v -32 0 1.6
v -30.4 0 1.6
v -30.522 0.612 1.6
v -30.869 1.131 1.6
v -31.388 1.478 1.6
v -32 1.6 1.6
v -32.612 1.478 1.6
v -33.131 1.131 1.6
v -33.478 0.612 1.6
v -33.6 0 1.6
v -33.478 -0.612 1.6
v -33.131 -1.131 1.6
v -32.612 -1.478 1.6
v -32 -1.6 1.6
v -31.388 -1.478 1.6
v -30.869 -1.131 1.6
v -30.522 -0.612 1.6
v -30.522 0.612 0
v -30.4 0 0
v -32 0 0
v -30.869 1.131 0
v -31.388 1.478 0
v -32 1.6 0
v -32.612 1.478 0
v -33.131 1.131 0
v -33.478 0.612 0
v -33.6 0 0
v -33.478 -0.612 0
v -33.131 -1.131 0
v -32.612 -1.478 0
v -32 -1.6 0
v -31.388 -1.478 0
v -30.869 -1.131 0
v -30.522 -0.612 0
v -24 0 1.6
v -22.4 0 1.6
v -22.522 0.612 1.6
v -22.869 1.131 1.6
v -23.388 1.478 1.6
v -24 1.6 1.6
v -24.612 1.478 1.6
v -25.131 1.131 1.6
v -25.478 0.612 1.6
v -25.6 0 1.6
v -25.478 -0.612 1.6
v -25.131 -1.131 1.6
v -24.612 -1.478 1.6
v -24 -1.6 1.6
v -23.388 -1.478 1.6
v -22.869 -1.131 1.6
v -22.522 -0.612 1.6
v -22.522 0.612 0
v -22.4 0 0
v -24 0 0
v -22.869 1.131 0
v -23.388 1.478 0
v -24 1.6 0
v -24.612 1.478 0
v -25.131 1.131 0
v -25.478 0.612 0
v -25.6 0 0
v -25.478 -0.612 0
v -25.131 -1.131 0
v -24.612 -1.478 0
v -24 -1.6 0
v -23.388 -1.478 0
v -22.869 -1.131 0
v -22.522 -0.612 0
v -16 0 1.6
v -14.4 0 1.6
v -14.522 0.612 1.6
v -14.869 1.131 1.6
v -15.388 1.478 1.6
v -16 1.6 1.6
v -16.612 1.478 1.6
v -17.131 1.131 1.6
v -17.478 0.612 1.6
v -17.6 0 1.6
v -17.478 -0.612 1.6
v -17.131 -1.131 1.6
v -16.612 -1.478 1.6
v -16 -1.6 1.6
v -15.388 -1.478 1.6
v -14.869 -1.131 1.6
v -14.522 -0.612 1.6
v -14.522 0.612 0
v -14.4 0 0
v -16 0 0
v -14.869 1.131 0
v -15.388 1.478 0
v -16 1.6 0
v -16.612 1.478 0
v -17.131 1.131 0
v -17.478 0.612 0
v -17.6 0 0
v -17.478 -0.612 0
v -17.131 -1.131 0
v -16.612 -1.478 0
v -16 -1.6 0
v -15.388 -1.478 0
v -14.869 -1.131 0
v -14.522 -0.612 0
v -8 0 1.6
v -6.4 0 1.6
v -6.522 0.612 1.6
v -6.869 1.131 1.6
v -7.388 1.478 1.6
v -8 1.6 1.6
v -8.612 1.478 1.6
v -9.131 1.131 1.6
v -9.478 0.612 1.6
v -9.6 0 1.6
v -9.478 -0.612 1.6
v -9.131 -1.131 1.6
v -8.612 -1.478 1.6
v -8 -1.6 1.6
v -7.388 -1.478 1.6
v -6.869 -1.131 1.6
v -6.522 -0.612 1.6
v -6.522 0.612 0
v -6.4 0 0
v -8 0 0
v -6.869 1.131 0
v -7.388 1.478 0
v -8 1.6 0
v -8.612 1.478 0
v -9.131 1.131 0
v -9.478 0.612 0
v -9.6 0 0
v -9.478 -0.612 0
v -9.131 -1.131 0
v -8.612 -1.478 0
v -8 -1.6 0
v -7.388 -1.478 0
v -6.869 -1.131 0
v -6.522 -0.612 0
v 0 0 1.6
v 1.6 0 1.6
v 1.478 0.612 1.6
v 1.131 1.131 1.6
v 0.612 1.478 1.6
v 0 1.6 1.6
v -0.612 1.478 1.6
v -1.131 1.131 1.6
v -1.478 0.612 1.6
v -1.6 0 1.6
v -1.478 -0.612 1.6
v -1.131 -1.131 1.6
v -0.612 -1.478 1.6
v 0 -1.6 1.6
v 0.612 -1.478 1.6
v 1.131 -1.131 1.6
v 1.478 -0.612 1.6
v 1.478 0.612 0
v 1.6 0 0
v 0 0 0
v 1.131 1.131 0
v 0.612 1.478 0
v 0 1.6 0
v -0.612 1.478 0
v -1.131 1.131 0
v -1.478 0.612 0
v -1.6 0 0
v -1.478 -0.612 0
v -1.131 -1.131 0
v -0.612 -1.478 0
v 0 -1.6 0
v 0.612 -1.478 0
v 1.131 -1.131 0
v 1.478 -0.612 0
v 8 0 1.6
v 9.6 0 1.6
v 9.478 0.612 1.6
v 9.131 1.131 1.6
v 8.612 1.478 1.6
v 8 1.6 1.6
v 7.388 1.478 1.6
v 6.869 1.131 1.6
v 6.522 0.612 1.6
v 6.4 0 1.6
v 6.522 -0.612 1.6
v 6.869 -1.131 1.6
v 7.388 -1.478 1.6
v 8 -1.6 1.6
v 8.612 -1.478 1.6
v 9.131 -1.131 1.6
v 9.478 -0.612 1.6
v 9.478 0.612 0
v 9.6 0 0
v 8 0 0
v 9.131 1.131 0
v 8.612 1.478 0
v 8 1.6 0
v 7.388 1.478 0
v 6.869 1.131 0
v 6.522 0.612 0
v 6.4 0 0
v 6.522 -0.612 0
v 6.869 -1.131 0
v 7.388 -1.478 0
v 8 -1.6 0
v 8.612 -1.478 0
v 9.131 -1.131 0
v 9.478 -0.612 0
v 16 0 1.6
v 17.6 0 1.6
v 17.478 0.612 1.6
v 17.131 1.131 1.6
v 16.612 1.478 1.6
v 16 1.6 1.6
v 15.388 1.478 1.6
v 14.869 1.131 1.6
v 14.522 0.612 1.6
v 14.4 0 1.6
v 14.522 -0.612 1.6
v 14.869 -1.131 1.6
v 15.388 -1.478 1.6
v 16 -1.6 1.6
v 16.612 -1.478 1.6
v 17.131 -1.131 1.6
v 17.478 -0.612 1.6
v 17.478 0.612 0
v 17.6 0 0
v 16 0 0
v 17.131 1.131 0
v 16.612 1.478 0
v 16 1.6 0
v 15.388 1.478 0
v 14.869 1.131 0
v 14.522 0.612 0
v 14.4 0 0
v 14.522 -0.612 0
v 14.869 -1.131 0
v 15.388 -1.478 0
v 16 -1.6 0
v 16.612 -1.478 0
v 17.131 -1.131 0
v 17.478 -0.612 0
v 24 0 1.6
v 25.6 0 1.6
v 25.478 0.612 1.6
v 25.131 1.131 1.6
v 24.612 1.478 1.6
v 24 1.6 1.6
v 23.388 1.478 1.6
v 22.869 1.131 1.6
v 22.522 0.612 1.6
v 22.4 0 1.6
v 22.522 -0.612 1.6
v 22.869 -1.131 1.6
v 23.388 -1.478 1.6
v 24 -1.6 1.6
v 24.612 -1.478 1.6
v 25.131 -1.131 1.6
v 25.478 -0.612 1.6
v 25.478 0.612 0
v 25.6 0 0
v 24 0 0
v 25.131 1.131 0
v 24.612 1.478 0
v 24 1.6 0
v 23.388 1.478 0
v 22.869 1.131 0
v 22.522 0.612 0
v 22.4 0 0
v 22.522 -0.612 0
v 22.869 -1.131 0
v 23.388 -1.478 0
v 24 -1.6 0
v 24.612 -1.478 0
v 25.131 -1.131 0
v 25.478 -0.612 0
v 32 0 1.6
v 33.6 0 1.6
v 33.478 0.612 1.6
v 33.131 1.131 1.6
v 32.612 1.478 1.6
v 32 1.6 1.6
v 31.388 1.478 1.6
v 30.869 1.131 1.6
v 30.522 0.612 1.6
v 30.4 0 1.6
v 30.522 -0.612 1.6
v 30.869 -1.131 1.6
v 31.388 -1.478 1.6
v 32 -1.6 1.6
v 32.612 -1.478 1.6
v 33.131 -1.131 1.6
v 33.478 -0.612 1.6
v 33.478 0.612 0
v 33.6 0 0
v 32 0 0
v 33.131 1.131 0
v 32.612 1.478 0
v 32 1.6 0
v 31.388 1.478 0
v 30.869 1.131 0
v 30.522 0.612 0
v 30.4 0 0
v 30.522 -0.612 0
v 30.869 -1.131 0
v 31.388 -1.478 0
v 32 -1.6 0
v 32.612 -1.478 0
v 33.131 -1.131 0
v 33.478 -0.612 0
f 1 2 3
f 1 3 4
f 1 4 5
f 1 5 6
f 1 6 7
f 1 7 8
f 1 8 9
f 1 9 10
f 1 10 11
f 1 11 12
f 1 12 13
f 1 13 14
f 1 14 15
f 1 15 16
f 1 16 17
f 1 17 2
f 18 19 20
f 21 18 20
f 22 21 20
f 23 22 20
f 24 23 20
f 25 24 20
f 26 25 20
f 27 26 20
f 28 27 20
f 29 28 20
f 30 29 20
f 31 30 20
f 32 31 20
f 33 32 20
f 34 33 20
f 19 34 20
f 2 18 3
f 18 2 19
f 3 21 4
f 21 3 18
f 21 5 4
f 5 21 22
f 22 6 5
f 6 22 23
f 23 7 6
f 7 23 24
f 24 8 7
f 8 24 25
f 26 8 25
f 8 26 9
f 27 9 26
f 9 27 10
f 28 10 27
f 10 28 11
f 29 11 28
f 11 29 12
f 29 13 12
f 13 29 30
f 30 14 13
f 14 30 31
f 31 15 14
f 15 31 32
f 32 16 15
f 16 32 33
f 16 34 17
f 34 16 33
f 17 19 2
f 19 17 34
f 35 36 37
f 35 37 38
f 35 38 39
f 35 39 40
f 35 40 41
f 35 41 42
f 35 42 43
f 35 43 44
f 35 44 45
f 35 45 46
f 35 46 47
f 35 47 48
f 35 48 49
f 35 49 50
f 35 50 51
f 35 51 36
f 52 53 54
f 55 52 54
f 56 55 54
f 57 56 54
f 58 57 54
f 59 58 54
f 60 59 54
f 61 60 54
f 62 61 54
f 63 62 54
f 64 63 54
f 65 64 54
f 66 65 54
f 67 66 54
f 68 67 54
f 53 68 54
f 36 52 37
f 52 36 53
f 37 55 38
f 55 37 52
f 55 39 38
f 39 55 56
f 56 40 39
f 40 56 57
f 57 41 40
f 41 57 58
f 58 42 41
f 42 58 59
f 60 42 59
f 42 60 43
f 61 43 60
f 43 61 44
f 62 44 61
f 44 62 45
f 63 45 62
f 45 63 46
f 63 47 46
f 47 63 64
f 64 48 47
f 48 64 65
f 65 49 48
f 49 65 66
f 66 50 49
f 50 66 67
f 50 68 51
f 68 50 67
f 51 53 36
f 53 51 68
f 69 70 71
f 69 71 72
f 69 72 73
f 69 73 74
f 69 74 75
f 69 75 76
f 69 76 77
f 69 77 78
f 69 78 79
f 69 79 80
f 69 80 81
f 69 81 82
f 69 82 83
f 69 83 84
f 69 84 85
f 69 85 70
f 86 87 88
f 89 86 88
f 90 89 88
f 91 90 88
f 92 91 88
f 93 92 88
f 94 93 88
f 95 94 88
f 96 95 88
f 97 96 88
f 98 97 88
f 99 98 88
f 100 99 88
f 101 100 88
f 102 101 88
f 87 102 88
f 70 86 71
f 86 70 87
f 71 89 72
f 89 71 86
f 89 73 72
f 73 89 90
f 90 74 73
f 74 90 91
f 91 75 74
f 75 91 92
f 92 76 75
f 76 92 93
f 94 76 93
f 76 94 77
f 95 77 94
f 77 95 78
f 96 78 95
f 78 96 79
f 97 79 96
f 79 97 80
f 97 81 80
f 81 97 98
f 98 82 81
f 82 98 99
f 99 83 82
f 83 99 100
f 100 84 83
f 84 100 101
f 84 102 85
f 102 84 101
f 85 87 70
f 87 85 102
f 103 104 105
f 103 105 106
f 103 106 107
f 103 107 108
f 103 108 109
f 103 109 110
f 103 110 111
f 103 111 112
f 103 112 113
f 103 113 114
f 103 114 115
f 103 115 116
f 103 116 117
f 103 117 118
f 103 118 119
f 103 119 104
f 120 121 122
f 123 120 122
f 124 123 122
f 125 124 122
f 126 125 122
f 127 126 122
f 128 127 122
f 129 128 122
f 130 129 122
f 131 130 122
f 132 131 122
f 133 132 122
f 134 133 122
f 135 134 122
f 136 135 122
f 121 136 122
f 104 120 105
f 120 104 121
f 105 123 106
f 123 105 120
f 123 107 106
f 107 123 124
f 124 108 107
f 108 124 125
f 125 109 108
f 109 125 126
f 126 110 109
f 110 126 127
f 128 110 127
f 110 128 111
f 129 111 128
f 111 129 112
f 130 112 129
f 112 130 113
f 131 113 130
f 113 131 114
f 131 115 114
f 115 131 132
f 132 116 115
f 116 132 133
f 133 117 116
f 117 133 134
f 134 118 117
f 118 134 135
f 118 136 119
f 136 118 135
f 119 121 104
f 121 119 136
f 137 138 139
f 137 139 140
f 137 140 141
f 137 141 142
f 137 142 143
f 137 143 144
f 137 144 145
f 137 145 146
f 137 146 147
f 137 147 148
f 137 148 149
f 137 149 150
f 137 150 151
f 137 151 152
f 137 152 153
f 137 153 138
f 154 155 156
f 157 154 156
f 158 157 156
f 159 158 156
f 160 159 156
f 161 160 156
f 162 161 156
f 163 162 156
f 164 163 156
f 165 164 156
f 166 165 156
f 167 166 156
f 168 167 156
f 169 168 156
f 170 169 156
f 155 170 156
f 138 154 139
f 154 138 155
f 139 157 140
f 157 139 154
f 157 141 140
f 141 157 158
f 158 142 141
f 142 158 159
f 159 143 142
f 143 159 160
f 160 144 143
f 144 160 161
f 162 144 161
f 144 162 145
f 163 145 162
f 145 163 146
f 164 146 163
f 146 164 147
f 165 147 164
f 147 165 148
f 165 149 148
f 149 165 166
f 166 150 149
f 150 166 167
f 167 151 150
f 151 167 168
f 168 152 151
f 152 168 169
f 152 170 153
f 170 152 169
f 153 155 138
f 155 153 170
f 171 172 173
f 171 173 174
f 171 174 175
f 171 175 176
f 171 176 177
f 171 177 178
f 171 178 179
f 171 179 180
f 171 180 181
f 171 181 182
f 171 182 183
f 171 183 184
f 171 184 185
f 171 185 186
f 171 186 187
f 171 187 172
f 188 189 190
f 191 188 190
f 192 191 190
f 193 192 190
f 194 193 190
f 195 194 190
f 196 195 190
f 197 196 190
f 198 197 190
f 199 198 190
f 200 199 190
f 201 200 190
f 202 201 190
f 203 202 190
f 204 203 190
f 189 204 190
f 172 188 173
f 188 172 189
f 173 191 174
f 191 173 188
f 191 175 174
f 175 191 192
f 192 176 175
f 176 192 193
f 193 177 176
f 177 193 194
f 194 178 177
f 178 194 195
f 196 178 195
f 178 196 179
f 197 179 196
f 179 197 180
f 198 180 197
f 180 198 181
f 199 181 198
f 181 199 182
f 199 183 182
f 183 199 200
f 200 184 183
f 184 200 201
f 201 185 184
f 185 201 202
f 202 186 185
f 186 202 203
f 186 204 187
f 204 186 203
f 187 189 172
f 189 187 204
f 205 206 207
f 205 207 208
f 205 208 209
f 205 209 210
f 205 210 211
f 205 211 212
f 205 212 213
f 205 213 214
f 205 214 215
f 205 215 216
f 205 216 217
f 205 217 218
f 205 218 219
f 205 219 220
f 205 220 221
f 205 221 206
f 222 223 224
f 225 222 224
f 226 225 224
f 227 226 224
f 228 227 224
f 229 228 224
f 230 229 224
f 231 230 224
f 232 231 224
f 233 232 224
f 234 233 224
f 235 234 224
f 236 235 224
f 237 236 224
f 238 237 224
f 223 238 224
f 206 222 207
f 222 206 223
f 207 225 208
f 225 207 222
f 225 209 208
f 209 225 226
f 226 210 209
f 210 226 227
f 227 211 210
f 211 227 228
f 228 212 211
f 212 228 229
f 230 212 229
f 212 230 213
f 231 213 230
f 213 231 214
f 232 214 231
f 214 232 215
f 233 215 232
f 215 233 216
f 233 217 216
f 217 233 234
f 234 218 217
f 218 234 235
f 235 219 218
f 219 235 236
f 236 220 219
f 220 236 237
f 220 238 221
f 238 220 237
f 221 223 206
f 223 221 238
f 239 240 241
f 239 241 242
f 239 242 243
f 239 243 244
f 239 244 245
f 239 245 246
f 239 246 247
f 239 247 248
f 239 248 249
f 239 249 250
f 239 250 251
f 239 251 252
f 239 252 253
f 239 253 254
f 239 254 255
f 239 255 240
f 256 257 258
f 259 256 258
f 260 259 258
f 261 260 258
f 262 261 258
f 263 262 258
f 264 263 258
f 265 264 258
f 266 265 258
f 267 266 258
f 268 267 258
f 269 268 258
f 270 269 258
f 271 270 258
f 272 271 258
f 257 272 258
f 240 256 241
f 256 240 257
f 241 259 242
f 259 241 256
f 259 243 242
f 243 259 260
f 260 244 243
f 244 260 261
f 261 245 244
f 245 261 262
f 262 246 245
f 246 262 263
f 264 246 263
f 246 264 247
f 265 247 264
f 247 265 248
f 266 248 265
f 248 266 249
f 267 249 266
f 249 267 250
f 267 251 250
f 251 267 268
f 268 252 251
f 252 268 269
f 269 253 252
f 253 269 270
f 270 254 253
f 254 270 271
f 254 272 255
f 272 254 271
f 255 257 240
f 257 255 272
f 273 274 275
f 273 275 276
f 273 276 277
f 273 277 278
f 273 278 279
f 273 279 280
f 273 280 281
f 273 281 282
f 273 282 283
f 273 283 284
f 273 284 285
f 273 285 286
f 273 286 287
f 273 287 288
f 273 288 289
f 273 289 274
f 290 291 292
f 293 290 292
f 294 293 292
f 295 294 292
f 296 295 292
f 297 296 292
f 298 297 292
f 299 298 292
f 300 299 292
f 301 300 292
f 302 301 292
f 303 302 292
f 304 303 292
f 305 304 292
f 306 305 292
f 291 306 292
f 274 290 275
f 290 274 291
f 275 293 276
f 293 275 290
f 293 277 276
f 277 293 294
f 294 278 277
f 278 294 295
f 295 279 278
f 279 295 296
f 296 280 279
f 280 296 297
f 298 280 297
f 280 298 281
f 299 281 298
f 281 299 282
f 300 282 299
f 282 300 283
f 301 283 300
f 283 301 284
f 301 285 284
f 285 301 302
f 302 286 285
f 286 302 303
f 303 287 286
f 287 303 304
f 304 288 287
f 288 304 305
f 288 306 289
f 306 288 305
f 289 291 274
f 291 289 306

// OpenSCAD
// file: 4-4edge.scad
use <../lib.scad>
function ldraw_lib__4_4edge() = [
// 0 Circle 1.0
// 0 Name: 4-4edge.dat
// 0 Author: James Jessiman
// 0 !LDRAW_ORG Primitive UPDATE 2017-01
// 0 !LICENSE Licensed under CC BY 2.0 and CC BY 4.0 : see CAreadme.txt
// 
// 0 BFC CERTIFY CCW
  [0,"BFC","CERTIFY"],
  [0,"BFC","CCW"],
// 
// 0 !HISTORY 1998-12-15 [PTadmin] Official Update 1998-10
// 0 !HISTORY 2005-12-28 [PTadmin] Official Update 2005-01
// 0 !HISTORY 2007-06-24 [PTadmin] Header formatted for Contributor Agreement
// 0 !HISTORY 2008-07-01 [PTadmin] Official Update 2008-01
// 0 !HISTORY 2017-01-15 [Steffen] BFCed
// 0 !HISTORY 2017-12-30 [PTadmin] Official Update 2017-01
// 
// 
// 2 24 1 0 0 0.9239 0 0.3827
  [2,24,1,0,0,0.9239,0,0.3827],
// 2 24 0.9239 0 0.3827 0.7071 0 0.7071
  [2,24,0.9239,0,0.3827,0.7071,0,0.7071],
// 2 24 0.7071 0 0.7071 0.3827 0 0.9239
  [2,24,0.7071,0,0.7071,0.3827,0,0.9239],
// 2 24 0.3827 0 0.9239 0 0 1
  [2,24,0.3827,0,0.9239,0,0,1],
// 2 24 0 0 1 -0.3827 0 0.9239
  [2,24,0,0,1,-0.3827,0,0.9239],
// 2 24 -0.3827 0 0.9239 -0.7071 0 0.7071
  [2,24,-0.3827,0,0.9239,-0.7071,0,0.7071],
// 2 24 -0.7071 0 0.7071 -0.9239 0 0.3827
  [2,24,-0.7071,0,0.7071,-0.9239,0,0.3827],
// 2 24 -0.9239 0 0.3827 -1 0 -0
  [2,24,-0.9239,0,0.3827,-1,0,-0],
// 2 24 -1 0 -0 -0.9239 0 -0.3827
  [2,24,-1,0,-0,-0.9239,0,-0.3827],
// 2 24 -0.9239 0 -0.3827 -0.7071 0 -0.7071
  [2,24,-0.9239,0,-0.3827,-0.7071,0,-0.7071],
// 2 24 -0.7071 0 -0.7071 -0.3827 0 -0.9239
  [2,24,-0.7071,0,-0.7071,-0.3827,0,-0.9239],
// 2 24 -0.3827 0 -0.9239 0 0 -1
  [2,24,-0.3827,0,-0.9239,0,0,-1],
// 2 24 0 0 -1 0.3827 0 -0.9239
  [2,24,0,0,-1,0.3827,0,-0.9239],
// 2 24 0.3827 0 -0.9239 0.7071 0 -0.7071
  [2,24,0.3827,0,-0.9239,0.7071,0,-0.7071],
// 2 24 0.7071 0 -0.7071 0.9239 0 -0.3827
  [2,24,0.7071,0,-0.7071,0.9239,0,-0.3827],
// 2 24 0.9239 0 -0.3827 1 0 0
  [2,24,0.9239,0,-0.3827,1,0,0],
];
module ldraw_lib__4_4edge(step=0, col=false, unit=2/5, alt=false, line=0.2, solid=!$preview)
    makepoly(ldraw_lib__4_4edge(), step=step, col=col, unit=unit, alt=alt, line=line, solid=solid);
ldraw_lib__4_4edge(line=0.2);
// file: 4-4disc.scad
use <../lib.scad>
function ldraw_lib__4_4disc() = [
// 0 Disc 1.0
// 0 Name: 4-4disc.dat
// 0 Author: James Jessiman
// 0 !LDRAW_ORG Primitive UPDATE 2002-02
// 0 !LICENSE Licensed under CC BY 2.0 and CC BY 4.0 : see CAreadme.txt
// 
// 0 BFC CERTIFY CCW
  [0,"BFC","CERTIFY"],
  [0,"BFC","CCW"],
// 
// 0 !HISTORY 1998-12-15 [PTadmin] Official Update 1998-10
// 0 !HISTORY 2002-03-23 [sbliss] Added BFC statement
// 0 !HISTORY 2002-04-25 [PTadmin] Official Update 2002-02
// 0 !HISTORY 2007-06-24 [PTadmin] Header formatted for Contributor Agreement
// 0 !HISTORY 2008-07-01 [PTadmin] Official Update 2008-01
// 
// 
// 3 16 0 0 0 1 0 0 0.9239 0 0.3827
  [3,16,0,0,0,1,0,0,0.9239,0,0.3827],
// 3 16 0 0 0 0.9239 0 0.3827 0.7071 0 0.7071
  [3,16,0,0,0,0.9239,0,0.3827,0.7071,0,0.7071],
// 3 16 0 0 0 0.7071 0 0.7071 0.3827 0 0.9239
  [3,16,0,0,0,0.7071,0,0.7071,0.3827,0,0.9239],
// 3 16 0 0 0 0.3827 0 0.9239 0 0 1
  [3,16,0,0,0,0.3827,0,0.9239,0,0,1],
// 3 16 0 0 0 0 0 1 -0.3827 0 0.9239
  [3,16,0,0,0,0,0,1,-0.3827,0,0.9239],
// 3 16 0 0 0 -0.3827 0 0.9239 -0.7071 0 0.7071
  [3,16,0,0,0,-0.3827,0,0.9239,-0.7071,0,0.7071],
// 3 16 0 0 0 -0.7071 0 0.7071 -0.9239 0 0.3827
  [3,16,0,0,0,-0.7071,0,0.7071,-0.9239,0,0.3827],
// 3 16 0 0 0 -0.9239 0 0.3827 -1 0 -0
  [3,16,0,0,0,-0.9239,0,0.3827,-1,0,-0],
// 3 16 0 0 0 -1 0 -0 -0.9239 0 -0.3827
  [3,16,0,0,0,-1,0,-0,-0.9239,0,-0.3827],
// 3 16 0 0 0 -0.9239 0 -0.3827 -0.7071 0 -0.7071
  [3,16,0,0,0,-0.9239,0,-0.3827,-0.7071,0,-0.7071],
// 3 16 0 0 0 -0.7071 0 -0.7071 -0.3827 0 -0.9239
  [3,16,0,0,0,-0.7071,0,-0.7071,-0.3827,0,-0.9239],
// 3 16 0 0 0 -0.3827 0 -0.9239 0 0 -1
  [3,16,0,0,0,-0.3827,0,-0.9239,0,0,-1],
// 3 16 0 0 0 0 0 -1 0.3827 0 -0.9239
  [3,16,0,0,0,0,0,-1,0.3827,0,-0.9239],
// 3 16 0 0 0 0.3827 0 -0.9239 0.7071 0 -0.7071
  [3,16,0,0,0,0.3827,0,-0.9239,0.7071,0,-0.7071],
// 3 16 0 0 0 0.7071 0 -0.7071 0.9239 0 -0.3827
  [3,16,0,0,0,0.7071,0,-0.7071,0.9239,0,-0.3827],
// 3 16 0 0 0 0.9239 0 -0.3827 1 0 0
  [3,16,0,0,0,0.9239,0,-0.3827,1,0,0],
// 0
];
module ldraw_lib__4_4disc(step=0, col=false, unit=2/5, alt=false, line=0.2, solid=!$preview)
    makepoly(ldraw_lib__4_4disc(), step=step, col=col, unit=unit, alt=alt, line=line, solid=solid);
ldraw_lib__4_4disc(line=0.2);
// file: 4-4cyli.scad
use <../lib.scad>
$fa=1; $fs=0.2;
function ldraw_lib__4_4cyli(realsolid=false) = [
// 0 Cylinder 1.0
// 0 Name: 4-4cyli.dat
// 0 Author: James Jessiman
// 0 !LDRAW_ORG Primitive UPDATE 2005-01
// 0 !LICENSE Licensed under CC BY 2.0 and CC BY 4.0 : see CAreadme.txt
// 
// 0 BFC CERTIFY CCW
  [0,"BFC","CERTIFY"],
  [0,"BFC","CCW"],
// 
// 0 !HISTORY 1998-12-15 [PTadmin] Official Update 1998-10
// 0 !HISTORY 2002-03-23 [sbliss] Added BFC statement; merged headers from files in distributions LDraw 0.27 and Complete.
// 0 !HISTORY 2002-04-25 [PTadmin] Official Update 2002-02
// 0 !HISTORY 2004-12-14 [guyvivan] BFC CCW
// 0 !HISTORY 2005-12-28 [PTadmin] Official Update 2005-01
// 0 !HISTORY 2007-06-24 [PTadmin] Header formatted for Contributor Agreement
// 0 !HISTORY 2008-07-01 [PTadmin] Official Update 2008-01
// 
// 
// 4 16 1 1 0 0.9239 1 0.3827 0.9239 0 0.3827 1 0 0
  [4,16,1,1,0,0.9239,1,0.3827,0.9239,0,0.3827,1,0,0],
// 5 24 1 0 0 1 1 0 0.9239 0 0.3827 0.9239 0 -0.3827
  [5,24,1,0,0,1,1,0,0.9239,0,0.3827,0.9239,0,-0.3827],
// 4 16 0.9239 1 0.3827 0.7071 1 0.7071 0.7071 0 0.7071 0.9239 0 0.3827
  [4,16,0.9239,1,0.3827,0.7071,1,0.7071,0.7071,0,0.7071,0.9239,0,0.3827],
// 5 24 0.9239 0 0.3827 0.9239 1 0.3827 0.7071 0 0.7071 1 0 0
  [5,24,0.9239,0,0.3827,0.9239,1,0.3827,0.7071,0,0.7071,1,0,0],
// 4 16 0.7071 1 0.7071 0.3827 1 0.9239 0.3827 0 0.9239 0.7071 0 0.7071
  [4,16,0.7071,1,0.7071,0.3827,1,0.9239,0.3827,0,0.9239,0.7071,0,0.7071],
// 5 24 0.7071 0 0.7071 0.7071 1 0.7071 0.3827 0 0.9239 0.9239 0 0.3827
  [5,24,0.7071,0,0.7071,0.7071,1,0.7071,0.3827,0,0.9239,0.9239,0,0.3827],
// 4 16 0.3827 1 0.9239 0 1 1 0 0 1 0.3827 0 0.9239
  [4,16,0.3827,1,0.9239,0,1,1,0,0,1,0.3827,0,0.9239],
// 5 24 0.3827 0 0.9239 0.3827 1 0.9239 0 0 1 0.7071 0 0.7071
  [5,24,0.3827,0,0.9239,0.3827,1,0.9239,0,0,1,0.7071,0,0.7071],
// 4 16 0 1 1 -0.3827 1 0.9239 -0.3827 0 0.9239 0 0 1
  [4,16,0,1,1,-0.3827,1,0.9239,-0.3827,0,0.9239,0,0,1],
// 5 24 0 0 1 0 1 1 -0.3827 0 0.9239 0.3827 0 0.9239
  [5,24,0,0,1,0,1,1,-0.3827,0,0.9239,0.3827,0,0.9239],
// 4 16 -0.3827 1 0.9239 -0.7071 1 0.7071 -0.7071 0 0.7071 -0.3827 0 0.9239
  [4,16,-0.3827,1,0.9239,-0.7071,1,0.7071,-0.7071,0,0.7071,-0.3827,0,0.9239],
// 5 24 -0.3827 0 0.9239 -0.3827 1 0.9239 -0.7071 0 0.7071 0 0 1
  [5,24,-0.3827,0,0.9239,-0.3827,1,0.9239,-0.7071,0,0.7071,0,0,1],
// 4 16 -0.7071 1 0.7071 -0.9239 1 0.3827 -0.9239 0 0.3827 -0.7071 0 0.7071
  [4,16,-0.7071,1,0.7071,-0.9239,1,0.3827,-0.9239,0,0.3827,-0.7071,0,0.7071],
// 5 24 -0.7071 0 0.7071 -0.7071 1 0.7071 -0.9239 0 0.3827 -0.3827 0 0.9239
  [5,24,-0.7071,0,0.7071,-0.7071,1,0.7071,-0.9239,0,0.3827,-0.3827,0,0.9239],
// 4 16 -0.9239 1 0.3827 -1 1 0 -1 0 0 -0.9239 0 0.3827
  [4,16,-0.9239,1,0.3827,-1,1,0,-1,0,0,-0.9239,0,0.3827],
// 5 24 -0.9239 0 0.3827 -0.9239 1 0.3827 -1 0 0 -0.7071 0 0.7071
  [5,24,-0.9239,0,0.3827,-0.9239,1,0.3827,-1,0,0,-0.7071,0,0.7071],
// 4 16 -1 1 0 -0.9239 1 -0.3827 -0.9239 0 -0.3827 -1 0 0
  [4,16,-1,1,0,-0.9239,1,-0.3827,-0.9239,0,-0.3827,-1,0,0],
// 5 24 -1 0 0 -1 1 0 -0.9239 0 -0.3827 -0.9239 0 0.3827
  [5,24,-1,0,0,-1,1,0,-0.9239,0,-0.3827,-0.9239,0,0.3827],
// 4 16 -0.9239 1 -0.3827 -0.7071 1 -0.7071 -0.7071 0 -0.7071 -0.9239 0 -0.3827
  [4,16,-0.9239,1,-0.3827,-0.7071,1,-0.7071,-0.7071,0,-0.7071,-0.9239,0,-0.3827],
// 5 24 -0.9239 0 -0.3827 -0.9239 1 -0.3827 -0.7071 0 -0.7071 -1 0 0
  [5,24,-0.9239,0,-0.3827,-0.9239,1,-0.3827,-0.7071,0,-0.7071,-1,0,0],
// 4 16 -0.7071 1 -0.7071 -0.3827 1 -0.9239 -0.3827 0 -0.9239 -0.7071 0 -0.7071
  [4,16,-0.7071,1,-0.7071,-0.3827,1,-0.9239,-0.3827,0,-0.9239,-0.7071,0,-0.7071],
// 5 24 -0.7071 0 -0.7071 -0.7071 1 -0.7071 -0.3827 0 -0.9239 -0.9239 0 -0.3827
  [5,24,-0.7071,0,-0.7071,-0.7071,1,-0.7071,-0.3827,0,-0.9239,-0.9239,0,-0.3827],
// 4 16 -0.3827 1 -0.9239 0 1 -1 0 0 -1 -0.3827 0 -0.9239
  [4,16,-0.3827,1,-0.9239,0,1,-1,0,0,-1,-0.3827,0,-0.9239],
// 5 24 -0.3827 0 -0.9239 -0.3827 1 -0.9239 0 0 -1 -0.7071 0 -0.7071
  [5,24,-0.3827,0,-0.9239,-0.3827,1,-0.9239,0,0,-1,-0.7071,0,-0.7071],
// 4 16 0 1 -1 0.3827 1 -0.9239 0.3827 0 -0.9239 0 0 -1
  [4,16,0,1,-1,0.3827,1,-0.9239,0.3827,0,-0.9239,0,0,-1],
// 5 24 0 0 -1 0 1 -1 0.3827 0 -0.9239 -0.3827 0 -0.9239
  [5,24,0,0,-1,0,1,-1,0.3827,0,-0.9239,-0.3827,0,-0.9239],
// 4 16 0.3827 1 -0.9239 0.7071 1 -0.7071 0.7071 0 -0.7071 0.3827 0 -0.9239
  [4,16,0.3827,1,-0.9239,0.7071,1,-0.7071,0.7071,0,-0.7071,0.3827,0,-0.9239],
// 5 24 0.3827 0 -0.9239 0.3827 1 -0.9239 0.7071 0 -0.7071 0 0 -1
  [5,24,0.3827,0,-0.9239,0.3827,1,-0.9239,0.7071,0,-0.7071,0,0,-1],
// 4 16 0.7071 1 -0.7071 0.9239 1 -0.3827 0.9239 0 -0.3827 0.7071 0 -0.7071
  [4,16,0.7071,1,-0.7071,0.9239,1,-0.3827,0.9239,0,-0.3827,0.7071,0,-0.7071],
// 5 24 0.7071 0 -0.7071 0.7071 1 -0.7071 0.9239 0 -0.3827 0.3827 0 -0.9239
  [5,24,0.7071,0,-0.7071,0.7071,1,-0.7071,0.9239,0,-0.3827,0.3827,0,-0.9239],
// 4 16 0.9239 1 -0.3827 1 1 0 1 0 0 0.9239 0 -0.3827
  [4,16,0.9239,1,-0.3827,1,1,0,1,0,0,0.9239,0,-0.3827],
// 5 24 0.9239 0 -0.3827 0.9239 1 -0.3827 1 0 0 0.7071 0 -0.7071
  [5,24,0.9239,0,-0.3827,0.9239,1,-0.3827,1,0,0,0.7071,0,-0.7071],
// 0
];
module ldraw_lib__4_4cyli(step=0, col=false, unit=2/5, alt=false, line=0.2, solid=!$preview)
    makepoly(ldraw_lib__4_4cyli(solid), step=step, col=col, unit=unit, alt=alt, line=line, solid=solid);
ldraw_lib__4_4cyli(line=0.2);
// file: stud3.scad
use <../lib.scad>
use <4-4cyli.scad>
use <4-4disc.scad>
use <4-4edge.scad>
function ldraw_lib__stud3() = [
// 0 Stud Tube Solid
// 0 Name: stud3.dat
// 0 Author: James Jessiman
// 0 !LDRAW_ORG Primitive UPDATE 2012-01
// 0 !LICENSE Licensed under CC BY 4.0 : see CAreadme.txt
// 
// 0 BFC CERTIFY CCW
  [0,"BFC","CERTIFY"],
  [0,"BFC","CCW"],
// 
// 0 !HISTORY 2002-04-04 [sbliss] Modified for BFC compliance
// 0 !HISTORY 2002-04-25 [PTadmin] Official Update 2002-02
// 0 !HISTORY 2007-06-24 [PTadmin] Header formatted for Contributor Agreement
// 0 !HISTORY 2008-07-01 [PTadmin] Official Update 2008-01
// 0 !HISTORY 2012-02-16 [Philo] Changed to CCW
// 0 !HISTORY 2012-03-30 [PTadmin] Official Update 2012-01
// 
// 
// 1 16 0 -4 0 4 0 0 0 1 0 0 0 4 4-4edge.dat
  [1,16,0,-4,0,4,0,0,0,1,0,0,0,4, ldraw_lib__4_4edge()],
// 1 16 0 0 0 4 0 0 0 1 0 0 0 4 4-4edge.dat
  [1,16,0,0,0,4,0,0,0,1,0,0,0,4, ldraw_lib__4_4edge()],
// 1 16 0 -4 0 4 0 0 0 1 0 0 0 4 4-4disc.dat
  [1,16,0,-4,0,4,0,0,0,1,0,0,0,4, ldraw_lib__4_4disc()],
  [-1,16,0,0,0,4,0,0,0,-1,0,0,0,4, ldraw_lib__4_4disc()],
// 1 16 0 -4 0 4 0 0 0 4 0 0 0 4 4-4cyli.dat
  [1,16,0,-4,0,4,0,0,0,4,0,0,0,4, ldraw_lib__4_4cyli()],
];
module ldraw_lib__stud3(step=0, col=false, unit=2/5, alt=false, line=0.2, solid=!$preview)
    makepoly(ldraw_lib__stud3(), step=step, col=col, unit=unit, alt=alt, line=line, solid=solid);
ldraw_lib__stud3(line=0.2);
// file: stug3-1x5.scad
use <../lib.scad>
use <stud3.scad>
$fa=1; $fs=0.2;
function ldraw_lib__stug3_1x5(realsolid=false) = [
// 0 Stud Tube Solid Group  1 x  5
// 0 Name: stug3-1x5.dat
// 0 Author: Steffen [Steffen]
// 0 !LDRAW_ORG Primitive UPDATE 2013-01
// 0 !LICENSE Licensed under CC BY 2.0 and CC BY 4.0 : see CAreadme.txt
// 
// 0 BFC CERTIFY CCW
  [0,"BFC","CERTIFY"],
  [0,"BFC","CCW"],
// 
// 0 !HISTORY 2013-07-21 [PTadmin] Official Update 2013-01
// 
// 
// 1 16 -40 0 0 1 0 0 0 1 0 0 0 1 stud3.dat
  [1,16,-40,0,0,1,0,0,0,1,0,0,0,1, ldraw_lib__stud3(realsolid)],
// 1 16 -20 0 0 1 0 0 0 1 0 0 0 1 stud3.dat
  [1,16,-20,0,0,1,0,0,0,1,0,0,0,1, ldraw_lib__stud3(realsolid)],
// 1 16 0 0 0 1 0 0 0 1 0 0 0 1 stud3.dat
  [1,16,0,0,0,1,0,0,0,1,0,0,0,1, ldraw_lib__stud3(realsolid)],
// 1 16 20 0 0 1 0 0 0 1 0 0 0 1 stud3.dat
  [1,16,20,0,0,1,0,0,0,1,0,0,0,1, ldraw_lib__stud3(realsolid)],
// 1 16 40 0 0 1 0 0 0 1 0 0 0 1 stud3.dat
  [1,16,40,0,0,1,0,0,0,1,0,0,0,1, ldraw_lib__stud3(realsolid)],
];
module ldraw_lib__stug3_1x5(step=0, col=false, unit=2/5, alt=false, line=0.2, solid=!$preview)
    makepoly(ldraw_lib__stug3_1x5(solid), step=step, col=col, unit=unit, alt=alt, line=line, solid=solid);
ldraw_lib__stug3_1x5(line=0.2);
// file: stug3-1x4.scad
use <../lib.scad>
use <stud3.scad>
function ldraw_lib__stug3_1x4() = [
// 0 Stud Tube Solid Group  1 x  4
// 0 Name: stug3-1x4.dat
// 0 Author: Steffen [Steffen]
// 0 !LDRAW_ORG Primitive UPDATE 2012-01
// 0 !LICENSE Licensed under CC BY 4.0 : see CAreadme.txt
// 
// 0 BFC CERTIFY CCW
  [0,"BFC","CERTIFY"],
  [0,"BFC","CCW"],
// 
// 0 !HISTORY 2012-03-30 [PTadmin] Official Update 2012-01
// 
// 
// 1 16 -30 0 0 1 0 0 0 1 0 0 0 1 stud3.dat
  [1,16,-30,0,0,1,0,0,0,1,0,0,0,1, ldraw_lib__stud3()],
// 1 16 -10 0 0 1 0 0 0 1 0 0 0 1 stud3.dat
  [1,16,-10,0,0,1,0,0,0,1,0,0,0,1, ldraw_lib__stud3()],
// 1 16 10 0 0 1 0 0 0 1 0 0 0 1 stud3.dat
  [1,16,10,0,0,1,0,0,0,1,0,0,0,1, ldraw_lib__stud3()],
// 1 16 30 0 0 1 0 0 0 1 0 0 0 1 stud3.dat
  [1,16,30,0,0,1,0,0,0,1,0,0,0,1, ldraw_lib__stud3()],
];
module ldraw_lib__stug3_1x4(step=0, col=false, unit=2/5, alt=false, line=0.2, solid=!$preview)
    makepoly(ldraw_lib__stug3_1x4(), step=step, col=col, unit=unit, alt=alt, line=line, solid=solid);
ldraw_lib__stug3_1x4(line=0.2);
// main file
use <../lib.scad>
use <stug3-1x4.scad>
use <stug3-1x5.scad>
function ldraw_lib__stug3_1x9() = [
// 0 Stud Tube Solid Group  1 x  9
// 0 Name: stug3-1x9.dat
// 0 Author: Steffen [Steffen]
// 0 !LDRAW_ORG Primitive UPDATE 2026-06
// 0 !LICENSE Licensed under CC BY 4.0 : see CAreadme.txt
// 
// 0 BFC CERTIFY CCW
  [0,"BFC","CERTIFY"],
  [0,"BFC","CCW"],
// 
// 0 !HISTORY 2026-06-28 [OrionP] Official Update 2026-06
// 
// 
// 1 16 -50 0 0 1 0 0 0 1 0 0 0 1 stug3-1x4.dat
  [1,16,-50,0,0,1,0,0,0,1,0,0,0,1, ldraw_lib__stug3_1x4()],
// 1 16 40 0 0 1 0 0 0 1 0 0 0 1 stug3-1x5.dat
  [1,16,40,0,0,1,0,0,0,1,0,0,0,1, ldraw_lib__stug3_1x5()],
];
module ldraw_lib__stug3_1x9(step=0, col=false, unit=2/5, alt=false, line=0.2, solid=!$preview)
    makepoly(ldraw_lib__stug3_1x9(), step=step, col=col, unit=unit, alt=alt, line=line, solid=solid);
ldraw_lib__stug3_1x9(line=0.2);
